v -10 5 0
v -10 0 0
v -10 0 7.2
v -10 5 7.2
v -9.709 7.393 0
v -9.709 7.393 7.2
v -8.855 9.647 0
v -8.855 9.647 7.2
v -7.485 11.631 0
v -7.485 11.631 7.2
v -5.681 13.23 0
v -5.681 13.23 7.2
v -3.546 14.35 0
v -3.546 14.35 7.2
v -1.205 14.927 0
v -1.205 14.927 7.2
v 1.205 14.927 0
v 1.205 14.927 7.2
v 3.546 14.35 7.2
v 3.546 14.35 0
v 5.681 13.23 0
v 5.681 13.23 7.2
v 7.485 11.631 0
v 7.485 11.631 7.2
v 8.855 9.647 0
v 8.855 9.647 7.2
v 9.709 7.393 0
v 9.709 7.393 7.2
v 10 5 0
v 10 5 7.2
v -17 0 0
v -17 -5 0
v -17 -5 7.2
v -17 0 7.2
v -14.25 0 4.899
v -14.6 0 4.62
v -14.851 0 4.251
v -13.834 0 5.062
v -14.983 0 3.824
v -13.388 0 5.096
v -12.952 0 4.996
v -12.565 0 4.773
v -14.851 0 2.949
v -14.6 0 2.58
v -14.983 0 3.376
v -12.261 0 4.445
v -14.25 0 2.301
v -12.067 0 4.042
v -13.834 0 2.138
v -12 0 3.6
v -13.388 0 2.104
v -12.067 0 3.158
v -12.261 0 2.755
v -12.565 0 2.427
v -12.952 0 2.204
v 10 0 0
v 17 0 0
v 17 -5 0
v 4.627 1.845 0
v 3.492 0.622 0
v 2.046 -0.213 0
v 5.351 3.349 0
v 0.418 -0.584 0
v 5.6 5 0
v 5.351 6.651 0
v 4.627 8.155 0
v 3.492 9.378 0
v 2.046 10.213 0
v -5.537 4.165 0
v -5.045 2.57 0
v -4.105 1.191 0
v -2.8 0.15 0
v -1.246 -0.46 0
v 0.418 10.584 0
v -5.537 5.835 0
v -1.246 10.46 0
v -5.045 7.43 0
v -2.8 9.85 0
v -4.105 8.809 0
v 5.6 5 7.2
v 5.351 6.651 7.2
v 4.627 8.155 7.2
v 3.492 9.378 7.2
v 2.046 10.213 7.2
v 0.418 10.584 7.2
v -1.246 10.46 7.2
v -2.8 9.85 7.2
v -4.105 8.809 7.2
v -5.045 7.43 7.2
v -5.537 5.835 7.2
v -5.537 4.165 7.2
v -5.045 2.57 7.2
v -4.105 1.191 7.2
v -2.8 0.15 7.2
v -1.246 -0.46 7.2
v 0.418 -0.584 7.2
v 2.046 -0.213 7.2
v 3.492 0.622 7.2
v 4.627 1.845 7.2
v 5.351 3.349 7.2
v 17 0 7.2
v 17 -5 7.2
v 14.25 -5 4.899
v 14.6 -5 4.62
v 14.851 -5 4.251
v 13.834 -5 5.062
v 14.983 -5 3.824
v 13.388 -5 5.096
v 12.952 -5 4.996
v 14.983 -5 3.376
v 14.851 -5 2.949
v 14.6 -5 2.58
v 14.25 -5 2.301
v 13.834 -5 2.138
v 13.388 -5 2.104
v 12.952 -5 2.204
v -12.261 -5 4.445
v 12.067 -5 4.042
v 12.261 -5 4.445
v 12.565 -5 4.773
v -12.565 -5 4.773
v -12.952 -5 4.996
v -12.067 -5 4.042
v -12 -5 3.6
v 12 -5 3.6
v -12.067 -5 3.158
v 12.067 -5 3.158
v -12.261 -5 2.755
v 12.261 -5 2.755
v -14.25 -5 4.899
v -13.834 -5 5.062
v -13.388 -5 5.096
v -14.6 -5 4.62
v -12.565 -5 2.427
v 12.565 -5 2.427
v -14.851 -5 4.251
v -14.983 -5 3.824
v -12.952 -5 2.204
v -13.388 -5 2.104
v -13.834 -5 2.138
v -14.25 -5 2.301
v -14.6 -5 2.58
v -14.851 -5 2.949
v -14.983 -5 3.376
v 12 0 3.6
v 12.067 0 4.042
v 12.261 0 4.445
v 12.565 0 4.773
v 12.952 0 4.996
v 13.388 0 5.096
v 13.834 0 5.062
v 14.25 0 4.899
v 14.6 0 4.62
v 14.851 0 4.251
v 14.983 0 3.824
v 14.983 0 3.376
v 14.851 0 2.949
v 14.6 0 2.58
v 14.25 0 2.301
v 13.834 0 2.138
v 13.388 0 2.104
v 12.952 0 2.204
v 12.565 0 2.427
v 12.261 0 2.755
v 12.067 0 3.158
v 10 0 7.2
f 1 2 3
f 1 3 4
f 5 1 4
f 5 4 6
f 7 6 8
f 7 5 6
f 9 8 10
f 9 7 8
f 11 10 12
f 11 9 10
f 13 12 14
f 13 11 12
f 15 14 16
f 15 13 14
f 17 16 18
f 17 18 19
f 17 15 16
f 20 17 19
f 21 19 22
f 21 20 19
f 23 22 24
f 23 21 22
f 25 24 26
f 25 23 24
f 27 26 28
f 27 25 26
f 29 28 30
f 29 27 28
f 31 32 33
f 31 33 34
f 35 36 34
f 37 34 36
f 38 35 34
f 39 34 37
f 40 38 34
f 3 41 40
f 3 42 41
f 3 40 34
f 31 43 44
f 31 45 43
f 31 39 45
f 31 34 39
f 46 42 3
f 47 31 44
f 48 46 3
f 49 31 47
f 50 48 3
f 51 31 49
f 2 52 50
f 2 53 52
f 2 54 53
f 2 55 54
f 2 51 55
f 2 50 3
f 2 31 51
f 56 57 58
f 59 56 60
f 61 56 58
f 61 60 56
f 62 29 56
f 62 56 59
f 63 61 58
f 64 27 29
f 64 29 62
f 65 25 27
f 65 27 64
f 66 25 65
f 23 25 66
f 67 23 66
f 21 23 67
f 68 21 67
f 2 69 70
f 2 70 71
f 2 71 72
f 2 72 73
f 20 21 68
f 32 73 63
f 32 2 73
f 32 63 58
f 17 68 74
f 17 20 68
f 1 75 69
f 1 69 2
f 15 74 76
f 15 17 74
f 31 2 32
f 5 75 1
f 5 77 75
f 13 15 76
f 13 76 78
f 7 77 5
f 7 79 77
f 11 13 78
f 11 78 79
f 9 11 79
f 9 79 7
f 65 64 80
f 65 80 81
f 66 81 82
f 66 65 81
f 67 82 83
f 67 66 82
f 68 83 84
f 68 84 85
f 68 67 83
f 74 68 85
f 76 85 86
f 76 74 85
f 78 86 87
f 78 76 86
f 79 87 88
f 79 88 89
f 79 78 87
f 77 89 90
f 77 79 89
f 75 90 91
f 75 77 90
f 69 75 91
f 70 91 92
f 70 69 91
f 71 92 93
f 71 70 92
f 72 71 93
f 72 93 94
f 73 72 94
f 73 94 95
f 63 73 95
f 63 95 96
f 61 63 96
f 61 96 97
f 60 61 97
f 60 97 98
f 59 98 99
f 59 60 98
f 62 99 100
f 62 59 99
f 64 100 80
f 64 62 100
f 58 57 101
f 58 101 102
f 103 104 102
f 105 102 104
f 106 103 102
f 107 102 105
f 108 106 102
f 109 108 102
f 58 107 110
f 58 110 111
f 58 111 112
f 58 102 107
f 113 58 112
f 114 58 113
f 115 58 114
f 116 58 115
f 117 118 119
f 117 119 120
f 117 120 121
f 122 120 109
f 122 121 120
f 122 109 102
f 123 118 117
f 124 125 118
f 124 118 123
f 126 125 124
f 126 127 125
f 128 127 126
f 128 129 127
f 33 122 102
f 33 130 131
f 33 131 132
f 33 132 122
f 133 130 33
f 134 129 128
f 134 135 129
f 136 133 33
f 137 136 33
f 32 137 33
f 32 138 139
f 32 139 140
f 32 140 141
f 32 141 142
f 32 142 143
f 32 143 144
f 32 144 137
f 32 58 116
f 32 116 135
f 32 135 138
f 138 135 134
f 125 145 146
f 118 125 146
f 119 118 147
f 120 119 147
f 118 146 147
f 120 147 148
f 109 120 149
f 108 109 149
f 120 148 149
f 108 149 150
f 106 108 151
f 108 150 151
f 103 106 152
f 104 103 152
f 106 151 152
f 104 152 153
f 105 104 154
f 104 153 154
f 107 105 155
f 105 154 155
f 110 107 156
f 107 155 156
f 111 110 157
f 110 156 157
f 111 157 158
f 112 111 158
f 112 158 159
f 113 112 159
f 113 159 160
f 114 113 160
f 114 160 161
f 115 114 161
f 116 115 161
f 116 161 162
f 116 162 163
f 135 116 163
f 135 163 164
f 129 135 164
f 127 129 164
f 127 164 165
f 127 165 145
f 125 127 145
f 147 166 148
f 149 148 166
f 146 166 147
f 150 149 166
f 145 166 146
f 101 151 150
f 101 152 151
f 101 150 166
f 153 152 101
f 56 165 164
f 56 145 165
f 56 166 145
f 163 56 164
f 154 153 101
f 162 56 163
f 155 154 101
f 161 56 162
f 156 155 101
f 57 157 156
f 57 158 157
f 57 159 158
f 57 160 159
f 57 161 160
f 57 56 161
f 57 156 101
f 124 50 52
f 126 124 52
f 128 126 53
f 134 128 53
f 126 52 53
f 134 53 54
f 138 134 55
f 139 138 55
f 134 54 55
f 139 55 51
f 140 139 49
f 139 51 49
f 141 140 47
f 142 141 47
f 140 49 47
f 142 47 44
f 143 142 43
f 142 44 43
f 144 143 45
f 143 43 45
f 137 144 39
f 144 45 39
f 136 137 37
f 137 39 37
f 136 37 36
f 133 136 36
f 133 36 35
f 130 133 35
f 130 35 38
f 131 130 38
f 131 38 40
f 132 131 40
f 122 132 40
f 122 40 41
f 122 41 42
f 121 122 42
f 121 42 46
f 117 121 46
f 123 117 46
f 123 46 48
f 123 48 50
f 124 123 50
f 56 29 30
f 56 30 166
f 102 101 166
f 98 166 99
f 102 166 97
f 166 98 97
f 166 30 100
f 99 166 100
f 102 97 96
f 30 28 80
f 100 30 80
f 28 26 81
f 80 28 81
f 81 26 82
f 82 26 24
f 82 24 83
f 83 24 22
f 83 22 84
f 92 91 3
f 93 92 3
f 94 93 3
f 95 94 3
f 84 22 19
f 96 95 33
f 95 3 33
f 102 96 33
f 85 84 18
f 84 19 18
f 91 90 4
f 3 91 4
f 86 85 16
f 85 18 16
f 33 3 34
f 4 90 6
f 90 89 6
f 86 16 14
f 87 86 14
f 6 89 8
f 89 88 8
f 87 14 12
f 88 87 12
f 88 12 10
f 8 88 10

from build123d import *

# Parameters (mm, degrees)
SKETCH1_R           = 5.6
BOSS_EXTRUDE1_DEPTH = 7.2
SKETCH2_R           = 1.5
CUT_EXTRUDE1_DEPTH  = 24.787391618


with BuildPart() as part:
    # Sketch1 → Boss-Extrude1 (new body)
    with BuildSketch(Plane.XY):
        with BuildLine():
            Line((10, 0), (17, 0))
            Line((17, 0), (17, -5))
            Line((17, -5), (-17, -5))
            Line((-17, -5), (-17, 0))
            Line((-17, 0), (-10, 0))
            Line((-10, 0), (-10, 5))
            ThreePointArc((-10, 5), (0, 15), (10, 5))
            Line((10, 5), (10, 0))
        make_face()
        with Locations((0, 5)):
            Circle(SKETCH1_R, mode=Mode.SUBTRACT)
    extrude(amount=BOSS_EXTRUDE1_DEPTH)

    # Sketch2 → Cut-Extrude1 (cut, through all)
    with BuildSketch(Plane(origin=(0, 0, 0), x_dir=(1, 0, 0), z_dir=(0, 1, 0))):
        with Locations(Location((13.5, -3.6, 0), (0, 0, 180))):
            Circle(SKETCH2_R)
        with Locations((-13.5, -3.6)):
            Circle(SKETCH2_R)
    extrude(amount=-CUT_EXTRUDE1_DEPTH, mode=Mode.SUBTRACT)


solid = part.part
